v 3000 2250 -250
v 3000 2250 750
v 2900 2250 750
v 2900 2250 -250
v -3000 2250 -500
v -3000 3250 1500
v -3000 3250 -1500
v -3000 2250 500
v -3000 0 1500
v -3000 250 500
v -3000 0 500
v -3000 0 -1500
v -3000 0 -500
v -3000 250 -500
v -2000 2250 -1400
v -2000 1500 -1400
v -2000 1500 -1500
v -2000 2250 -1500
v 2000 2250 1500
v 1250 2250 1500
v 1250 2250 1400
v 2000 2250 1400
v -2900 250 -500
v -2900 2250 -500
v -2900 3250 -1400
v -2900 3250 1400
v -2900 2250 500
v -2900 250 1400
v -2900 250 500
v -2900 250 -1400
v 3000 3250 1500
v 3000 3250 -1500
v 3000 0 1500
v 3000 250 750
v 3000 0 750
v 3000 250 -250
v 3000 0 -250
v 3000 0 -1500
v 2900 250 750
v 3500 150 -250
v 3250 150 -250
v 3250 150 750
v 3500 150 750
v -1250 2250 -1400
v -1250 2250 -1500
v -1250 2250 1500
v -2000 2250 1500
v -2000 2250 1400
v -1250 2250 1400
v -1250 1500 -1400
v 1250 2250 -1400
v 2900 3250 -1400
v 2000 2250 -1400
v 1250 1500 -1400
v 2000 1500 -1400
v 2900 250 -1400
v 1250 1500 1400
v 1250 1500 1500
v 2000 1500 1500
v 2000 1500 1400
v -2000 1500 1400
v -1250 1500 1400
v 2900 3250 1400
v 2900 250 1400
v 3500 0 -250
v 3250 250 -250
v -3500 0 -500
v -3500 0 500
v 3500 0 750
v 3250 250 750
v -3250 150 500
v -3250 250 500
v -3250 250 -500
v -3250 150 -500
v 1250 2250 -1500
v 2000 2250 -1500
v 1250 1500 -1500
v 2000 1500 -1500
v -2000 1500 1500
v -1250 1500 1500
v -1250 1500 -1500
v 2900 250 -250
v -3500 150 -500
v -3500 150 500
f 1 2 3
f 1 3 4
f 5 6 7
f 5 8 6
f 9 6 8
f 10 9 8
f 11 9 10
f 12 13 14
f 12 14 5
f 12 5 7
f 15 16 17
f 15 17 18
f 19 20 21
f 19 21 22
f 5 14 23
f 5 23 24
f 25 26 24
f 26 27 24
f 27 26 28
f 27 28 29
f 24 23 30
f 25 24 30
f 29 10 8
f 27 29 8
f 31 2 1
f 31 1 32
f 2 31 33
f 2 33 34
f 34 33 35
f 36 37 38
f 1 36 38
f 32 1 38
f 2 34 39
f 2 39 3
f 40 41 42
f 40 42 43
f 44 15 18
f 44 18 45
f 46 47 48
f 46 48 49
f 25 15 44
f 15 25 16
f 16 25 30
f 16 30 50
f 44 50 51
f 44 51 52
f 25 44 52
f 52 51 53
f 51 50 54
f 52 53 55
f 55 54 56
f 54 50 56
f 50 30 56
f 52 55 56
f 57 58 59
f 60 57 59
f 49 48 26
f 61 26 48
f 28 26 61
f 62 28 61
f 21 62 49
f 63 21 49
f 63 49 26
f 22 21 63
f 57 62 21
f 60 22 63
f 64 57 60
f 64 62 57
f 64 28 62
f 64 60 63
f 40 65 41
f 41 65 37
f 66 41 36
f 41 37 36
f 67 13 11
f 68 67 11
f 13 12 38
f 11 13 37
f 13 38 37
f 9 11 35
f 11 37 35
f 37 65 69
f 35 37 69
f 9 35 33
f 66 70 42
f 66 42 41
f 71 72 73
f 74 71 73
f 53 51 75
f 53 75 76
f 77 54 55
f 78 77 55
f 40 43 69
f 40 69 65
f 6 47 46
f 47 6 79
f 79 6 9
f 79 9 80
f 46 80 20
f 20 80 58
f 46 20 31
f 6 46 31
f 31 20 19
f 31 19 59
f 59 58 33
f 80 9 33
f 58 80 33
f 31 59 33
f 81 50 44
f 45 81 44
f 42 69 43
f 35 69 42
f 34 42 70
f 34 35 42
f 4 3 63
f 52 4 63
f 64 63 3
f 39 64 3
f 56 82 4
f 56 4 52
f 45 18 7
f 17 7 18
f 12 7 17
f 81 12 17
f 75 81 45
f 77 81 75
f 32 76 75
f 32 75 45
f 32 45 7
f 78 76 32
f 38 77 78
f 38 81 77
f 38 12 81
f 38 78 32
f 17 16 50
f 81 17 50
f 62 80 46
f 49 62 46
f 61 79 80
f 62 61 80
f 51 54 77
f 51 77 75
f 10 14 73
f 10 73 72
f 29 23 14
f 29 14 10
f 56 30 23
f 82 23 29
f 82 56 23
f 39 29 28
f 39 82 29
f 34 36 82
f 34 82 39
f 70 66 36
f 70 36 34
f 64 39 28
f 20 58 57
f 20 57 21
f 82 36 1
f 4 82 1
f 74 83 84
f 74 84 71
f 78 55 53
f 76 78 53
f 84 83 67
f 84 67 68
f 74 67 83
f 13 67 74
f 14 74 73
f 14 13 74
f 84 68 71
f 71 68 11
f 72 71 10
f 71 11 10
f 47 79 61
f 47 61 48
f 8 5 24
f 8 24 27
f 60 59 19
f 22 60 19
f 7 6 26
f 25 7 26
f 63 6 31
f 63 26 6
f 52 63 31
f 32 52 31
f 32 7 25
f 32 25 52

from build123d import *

# Parameters (mm, degrees)
SKETCH1_W           = 6000
SKETCH1_H           = 3000
BOSS_EXTRUDE1_DEPTH = 250
SKETCH2_W           = 6000
SKETCH2_H           = 3000
SKETCH2_W_2         = 5800
SKETCH2_H_2         = 2800
BOSS_EXTRUDE2_DEPTH = 3000
SKETCH3_W           = 1000
SKETCH3_H           = 2000
CUT_EXTRUDE1_DEPTH  = 250
SKETCH4_W           = 1000
SKETCH4_H           = 2000
CUT_EXTRUDE2_DEPTH  = 250
SKETCH5_W           = 750
SKETCH5_H           = 750
CUT_EXTRUDE3_DEPTH  = 3001
SKETCH6_W           = 1000
SKETCH6_H           = 250
BOSS_EXTRUDE4_DEPTH = 500
SKETCH7_W           = 1000
SKETCH7_H           = 250
BOSS_EXTRUDE5_DEPTH = 500
SKETCH8_W           = 250
SKETCH8_H           = 1000
CUT_EXTRUDE4_DEPTH  = 100
SKETCH9_W           = 250
SKETCH9_H           = 1000
CUT_EXTRUDE5_DEPTH  = 100


with BuildPart() as part:
    # Sketch1 → Boss-Extrude1 (new body)
    with BuildSketch(Plane(origin=(0, 0, 0), x_dir=(1, 0, 0), z_dir=(0, 1, 0))):
        Rectangle(SKETCH1_W, SKETCH1_H)
    extrude(amount=BOSS_EXTRUDE1_DEPTH)

    # Sketch2 → Boss-Extrude2 (add)
    with BuildSketch(Plane(origin=(0, 250, 0), x_dir=(1, 0, 0), z_dir=(0, 1, 0))):
        Rectangle(SKETCH2_W, SKETCH2_H)
        Rectangle(SKETCH2_W_2, SKETCH2_H_2, mode=Mode.SUBTRACT)
    extrude(amount=BOSS_EXTRUDE2_DEPTH)

    # Sketch3 → Cut-Extrude1 (cut)
    with BuildSketch(Plane.ZY.offset(3000)):
        with Locations((0, 1250)):
            Rectangle(SKETCH3_W, SKETCH3_H)
    extrude(amount=-CUT_EXTRUDE1_DEPTH, mode=Mode.SUBTRACT)

    # Sketch4 → Cut-Extrude2 (cut)
    with BuildSketch(Plane(origin=(3000, 0, 0), x_dir=(0, 0, -1), z_dir=(1, 0, 0))):
        with Locations((-250, 1250)):
            Rectangle(SKETCH4_W, SKETCH4_H)
    extrude(amount=-CUT_EXTRUDE2_DEPTH, mode=Mode.SUBTRACT)

    # Sketch5 → Cut-Extrude3 (cut, through all)
    with BuildSketch(Plane.XY.offset(1500)):
        with Locations((-1625, 1875)):
            Rectangle(SKETCH5_W, SKETCH5_H)
        with Locations((1625, 1875)):
            Rectangle(SKETCH5_W, SKETCH5_H)
    extrude(amount=-CUT_EXTRUDE3_DEPTH, mode=Mode.SUBTRACT)

    # Sketch6 → Boss-Extrude4 (add)
    with BuildSketch(Plane(origin=(3000, 0, 0), x_dir=(0, 0, -1), z_dir=(1, 0, 0))):
        with Locations((-250, 125)):
            Rectangle(SKETCH6_W, SKETCH6_H)
    extrude(amount=BOSS_EXTRUDE4_DEPTH)

    # Sketch7 → Boss-Extrude5 (add)
    with BuildSketch(Plane.ZY.offset(3000)):
        with Locations((0, 125)):
            Rectangle(SKETCH7_W, SKETCH7_H)
    extrude(amount=BOSS_EXTRUDE5_DEPTH)

    # Sketch8 → Cut-Extrude4 (cut)
    with BuildSketch(Plane(origin=(0, 250, 0), x_dir=(1, 0, 0), z_dir=(0, 1, 0))):
        with Locations((3375, -250)):
            Rectangle(SKETCH8_W, SKETCH8_H)
    extrude(amount=-CUT_EXTRUDE4_DEPTH, mode=Mode.SUBTRACT)

    # Sketch9 → Cut-Extrude5 (cut)
    with BuildSketch(Plane(origin=(0, 250, 0), x_dir=(1, 0, 0), z_dir=(0, 1, 0))):
        with Locations((-3375, 0)):
            Rectangle(SKETCH9_W, SKETCH9_H)
    extrude(amount=-CUT_EXTRUDE5_DEPTH, mode=Mode.SUBTRACT)


solid = part.part
